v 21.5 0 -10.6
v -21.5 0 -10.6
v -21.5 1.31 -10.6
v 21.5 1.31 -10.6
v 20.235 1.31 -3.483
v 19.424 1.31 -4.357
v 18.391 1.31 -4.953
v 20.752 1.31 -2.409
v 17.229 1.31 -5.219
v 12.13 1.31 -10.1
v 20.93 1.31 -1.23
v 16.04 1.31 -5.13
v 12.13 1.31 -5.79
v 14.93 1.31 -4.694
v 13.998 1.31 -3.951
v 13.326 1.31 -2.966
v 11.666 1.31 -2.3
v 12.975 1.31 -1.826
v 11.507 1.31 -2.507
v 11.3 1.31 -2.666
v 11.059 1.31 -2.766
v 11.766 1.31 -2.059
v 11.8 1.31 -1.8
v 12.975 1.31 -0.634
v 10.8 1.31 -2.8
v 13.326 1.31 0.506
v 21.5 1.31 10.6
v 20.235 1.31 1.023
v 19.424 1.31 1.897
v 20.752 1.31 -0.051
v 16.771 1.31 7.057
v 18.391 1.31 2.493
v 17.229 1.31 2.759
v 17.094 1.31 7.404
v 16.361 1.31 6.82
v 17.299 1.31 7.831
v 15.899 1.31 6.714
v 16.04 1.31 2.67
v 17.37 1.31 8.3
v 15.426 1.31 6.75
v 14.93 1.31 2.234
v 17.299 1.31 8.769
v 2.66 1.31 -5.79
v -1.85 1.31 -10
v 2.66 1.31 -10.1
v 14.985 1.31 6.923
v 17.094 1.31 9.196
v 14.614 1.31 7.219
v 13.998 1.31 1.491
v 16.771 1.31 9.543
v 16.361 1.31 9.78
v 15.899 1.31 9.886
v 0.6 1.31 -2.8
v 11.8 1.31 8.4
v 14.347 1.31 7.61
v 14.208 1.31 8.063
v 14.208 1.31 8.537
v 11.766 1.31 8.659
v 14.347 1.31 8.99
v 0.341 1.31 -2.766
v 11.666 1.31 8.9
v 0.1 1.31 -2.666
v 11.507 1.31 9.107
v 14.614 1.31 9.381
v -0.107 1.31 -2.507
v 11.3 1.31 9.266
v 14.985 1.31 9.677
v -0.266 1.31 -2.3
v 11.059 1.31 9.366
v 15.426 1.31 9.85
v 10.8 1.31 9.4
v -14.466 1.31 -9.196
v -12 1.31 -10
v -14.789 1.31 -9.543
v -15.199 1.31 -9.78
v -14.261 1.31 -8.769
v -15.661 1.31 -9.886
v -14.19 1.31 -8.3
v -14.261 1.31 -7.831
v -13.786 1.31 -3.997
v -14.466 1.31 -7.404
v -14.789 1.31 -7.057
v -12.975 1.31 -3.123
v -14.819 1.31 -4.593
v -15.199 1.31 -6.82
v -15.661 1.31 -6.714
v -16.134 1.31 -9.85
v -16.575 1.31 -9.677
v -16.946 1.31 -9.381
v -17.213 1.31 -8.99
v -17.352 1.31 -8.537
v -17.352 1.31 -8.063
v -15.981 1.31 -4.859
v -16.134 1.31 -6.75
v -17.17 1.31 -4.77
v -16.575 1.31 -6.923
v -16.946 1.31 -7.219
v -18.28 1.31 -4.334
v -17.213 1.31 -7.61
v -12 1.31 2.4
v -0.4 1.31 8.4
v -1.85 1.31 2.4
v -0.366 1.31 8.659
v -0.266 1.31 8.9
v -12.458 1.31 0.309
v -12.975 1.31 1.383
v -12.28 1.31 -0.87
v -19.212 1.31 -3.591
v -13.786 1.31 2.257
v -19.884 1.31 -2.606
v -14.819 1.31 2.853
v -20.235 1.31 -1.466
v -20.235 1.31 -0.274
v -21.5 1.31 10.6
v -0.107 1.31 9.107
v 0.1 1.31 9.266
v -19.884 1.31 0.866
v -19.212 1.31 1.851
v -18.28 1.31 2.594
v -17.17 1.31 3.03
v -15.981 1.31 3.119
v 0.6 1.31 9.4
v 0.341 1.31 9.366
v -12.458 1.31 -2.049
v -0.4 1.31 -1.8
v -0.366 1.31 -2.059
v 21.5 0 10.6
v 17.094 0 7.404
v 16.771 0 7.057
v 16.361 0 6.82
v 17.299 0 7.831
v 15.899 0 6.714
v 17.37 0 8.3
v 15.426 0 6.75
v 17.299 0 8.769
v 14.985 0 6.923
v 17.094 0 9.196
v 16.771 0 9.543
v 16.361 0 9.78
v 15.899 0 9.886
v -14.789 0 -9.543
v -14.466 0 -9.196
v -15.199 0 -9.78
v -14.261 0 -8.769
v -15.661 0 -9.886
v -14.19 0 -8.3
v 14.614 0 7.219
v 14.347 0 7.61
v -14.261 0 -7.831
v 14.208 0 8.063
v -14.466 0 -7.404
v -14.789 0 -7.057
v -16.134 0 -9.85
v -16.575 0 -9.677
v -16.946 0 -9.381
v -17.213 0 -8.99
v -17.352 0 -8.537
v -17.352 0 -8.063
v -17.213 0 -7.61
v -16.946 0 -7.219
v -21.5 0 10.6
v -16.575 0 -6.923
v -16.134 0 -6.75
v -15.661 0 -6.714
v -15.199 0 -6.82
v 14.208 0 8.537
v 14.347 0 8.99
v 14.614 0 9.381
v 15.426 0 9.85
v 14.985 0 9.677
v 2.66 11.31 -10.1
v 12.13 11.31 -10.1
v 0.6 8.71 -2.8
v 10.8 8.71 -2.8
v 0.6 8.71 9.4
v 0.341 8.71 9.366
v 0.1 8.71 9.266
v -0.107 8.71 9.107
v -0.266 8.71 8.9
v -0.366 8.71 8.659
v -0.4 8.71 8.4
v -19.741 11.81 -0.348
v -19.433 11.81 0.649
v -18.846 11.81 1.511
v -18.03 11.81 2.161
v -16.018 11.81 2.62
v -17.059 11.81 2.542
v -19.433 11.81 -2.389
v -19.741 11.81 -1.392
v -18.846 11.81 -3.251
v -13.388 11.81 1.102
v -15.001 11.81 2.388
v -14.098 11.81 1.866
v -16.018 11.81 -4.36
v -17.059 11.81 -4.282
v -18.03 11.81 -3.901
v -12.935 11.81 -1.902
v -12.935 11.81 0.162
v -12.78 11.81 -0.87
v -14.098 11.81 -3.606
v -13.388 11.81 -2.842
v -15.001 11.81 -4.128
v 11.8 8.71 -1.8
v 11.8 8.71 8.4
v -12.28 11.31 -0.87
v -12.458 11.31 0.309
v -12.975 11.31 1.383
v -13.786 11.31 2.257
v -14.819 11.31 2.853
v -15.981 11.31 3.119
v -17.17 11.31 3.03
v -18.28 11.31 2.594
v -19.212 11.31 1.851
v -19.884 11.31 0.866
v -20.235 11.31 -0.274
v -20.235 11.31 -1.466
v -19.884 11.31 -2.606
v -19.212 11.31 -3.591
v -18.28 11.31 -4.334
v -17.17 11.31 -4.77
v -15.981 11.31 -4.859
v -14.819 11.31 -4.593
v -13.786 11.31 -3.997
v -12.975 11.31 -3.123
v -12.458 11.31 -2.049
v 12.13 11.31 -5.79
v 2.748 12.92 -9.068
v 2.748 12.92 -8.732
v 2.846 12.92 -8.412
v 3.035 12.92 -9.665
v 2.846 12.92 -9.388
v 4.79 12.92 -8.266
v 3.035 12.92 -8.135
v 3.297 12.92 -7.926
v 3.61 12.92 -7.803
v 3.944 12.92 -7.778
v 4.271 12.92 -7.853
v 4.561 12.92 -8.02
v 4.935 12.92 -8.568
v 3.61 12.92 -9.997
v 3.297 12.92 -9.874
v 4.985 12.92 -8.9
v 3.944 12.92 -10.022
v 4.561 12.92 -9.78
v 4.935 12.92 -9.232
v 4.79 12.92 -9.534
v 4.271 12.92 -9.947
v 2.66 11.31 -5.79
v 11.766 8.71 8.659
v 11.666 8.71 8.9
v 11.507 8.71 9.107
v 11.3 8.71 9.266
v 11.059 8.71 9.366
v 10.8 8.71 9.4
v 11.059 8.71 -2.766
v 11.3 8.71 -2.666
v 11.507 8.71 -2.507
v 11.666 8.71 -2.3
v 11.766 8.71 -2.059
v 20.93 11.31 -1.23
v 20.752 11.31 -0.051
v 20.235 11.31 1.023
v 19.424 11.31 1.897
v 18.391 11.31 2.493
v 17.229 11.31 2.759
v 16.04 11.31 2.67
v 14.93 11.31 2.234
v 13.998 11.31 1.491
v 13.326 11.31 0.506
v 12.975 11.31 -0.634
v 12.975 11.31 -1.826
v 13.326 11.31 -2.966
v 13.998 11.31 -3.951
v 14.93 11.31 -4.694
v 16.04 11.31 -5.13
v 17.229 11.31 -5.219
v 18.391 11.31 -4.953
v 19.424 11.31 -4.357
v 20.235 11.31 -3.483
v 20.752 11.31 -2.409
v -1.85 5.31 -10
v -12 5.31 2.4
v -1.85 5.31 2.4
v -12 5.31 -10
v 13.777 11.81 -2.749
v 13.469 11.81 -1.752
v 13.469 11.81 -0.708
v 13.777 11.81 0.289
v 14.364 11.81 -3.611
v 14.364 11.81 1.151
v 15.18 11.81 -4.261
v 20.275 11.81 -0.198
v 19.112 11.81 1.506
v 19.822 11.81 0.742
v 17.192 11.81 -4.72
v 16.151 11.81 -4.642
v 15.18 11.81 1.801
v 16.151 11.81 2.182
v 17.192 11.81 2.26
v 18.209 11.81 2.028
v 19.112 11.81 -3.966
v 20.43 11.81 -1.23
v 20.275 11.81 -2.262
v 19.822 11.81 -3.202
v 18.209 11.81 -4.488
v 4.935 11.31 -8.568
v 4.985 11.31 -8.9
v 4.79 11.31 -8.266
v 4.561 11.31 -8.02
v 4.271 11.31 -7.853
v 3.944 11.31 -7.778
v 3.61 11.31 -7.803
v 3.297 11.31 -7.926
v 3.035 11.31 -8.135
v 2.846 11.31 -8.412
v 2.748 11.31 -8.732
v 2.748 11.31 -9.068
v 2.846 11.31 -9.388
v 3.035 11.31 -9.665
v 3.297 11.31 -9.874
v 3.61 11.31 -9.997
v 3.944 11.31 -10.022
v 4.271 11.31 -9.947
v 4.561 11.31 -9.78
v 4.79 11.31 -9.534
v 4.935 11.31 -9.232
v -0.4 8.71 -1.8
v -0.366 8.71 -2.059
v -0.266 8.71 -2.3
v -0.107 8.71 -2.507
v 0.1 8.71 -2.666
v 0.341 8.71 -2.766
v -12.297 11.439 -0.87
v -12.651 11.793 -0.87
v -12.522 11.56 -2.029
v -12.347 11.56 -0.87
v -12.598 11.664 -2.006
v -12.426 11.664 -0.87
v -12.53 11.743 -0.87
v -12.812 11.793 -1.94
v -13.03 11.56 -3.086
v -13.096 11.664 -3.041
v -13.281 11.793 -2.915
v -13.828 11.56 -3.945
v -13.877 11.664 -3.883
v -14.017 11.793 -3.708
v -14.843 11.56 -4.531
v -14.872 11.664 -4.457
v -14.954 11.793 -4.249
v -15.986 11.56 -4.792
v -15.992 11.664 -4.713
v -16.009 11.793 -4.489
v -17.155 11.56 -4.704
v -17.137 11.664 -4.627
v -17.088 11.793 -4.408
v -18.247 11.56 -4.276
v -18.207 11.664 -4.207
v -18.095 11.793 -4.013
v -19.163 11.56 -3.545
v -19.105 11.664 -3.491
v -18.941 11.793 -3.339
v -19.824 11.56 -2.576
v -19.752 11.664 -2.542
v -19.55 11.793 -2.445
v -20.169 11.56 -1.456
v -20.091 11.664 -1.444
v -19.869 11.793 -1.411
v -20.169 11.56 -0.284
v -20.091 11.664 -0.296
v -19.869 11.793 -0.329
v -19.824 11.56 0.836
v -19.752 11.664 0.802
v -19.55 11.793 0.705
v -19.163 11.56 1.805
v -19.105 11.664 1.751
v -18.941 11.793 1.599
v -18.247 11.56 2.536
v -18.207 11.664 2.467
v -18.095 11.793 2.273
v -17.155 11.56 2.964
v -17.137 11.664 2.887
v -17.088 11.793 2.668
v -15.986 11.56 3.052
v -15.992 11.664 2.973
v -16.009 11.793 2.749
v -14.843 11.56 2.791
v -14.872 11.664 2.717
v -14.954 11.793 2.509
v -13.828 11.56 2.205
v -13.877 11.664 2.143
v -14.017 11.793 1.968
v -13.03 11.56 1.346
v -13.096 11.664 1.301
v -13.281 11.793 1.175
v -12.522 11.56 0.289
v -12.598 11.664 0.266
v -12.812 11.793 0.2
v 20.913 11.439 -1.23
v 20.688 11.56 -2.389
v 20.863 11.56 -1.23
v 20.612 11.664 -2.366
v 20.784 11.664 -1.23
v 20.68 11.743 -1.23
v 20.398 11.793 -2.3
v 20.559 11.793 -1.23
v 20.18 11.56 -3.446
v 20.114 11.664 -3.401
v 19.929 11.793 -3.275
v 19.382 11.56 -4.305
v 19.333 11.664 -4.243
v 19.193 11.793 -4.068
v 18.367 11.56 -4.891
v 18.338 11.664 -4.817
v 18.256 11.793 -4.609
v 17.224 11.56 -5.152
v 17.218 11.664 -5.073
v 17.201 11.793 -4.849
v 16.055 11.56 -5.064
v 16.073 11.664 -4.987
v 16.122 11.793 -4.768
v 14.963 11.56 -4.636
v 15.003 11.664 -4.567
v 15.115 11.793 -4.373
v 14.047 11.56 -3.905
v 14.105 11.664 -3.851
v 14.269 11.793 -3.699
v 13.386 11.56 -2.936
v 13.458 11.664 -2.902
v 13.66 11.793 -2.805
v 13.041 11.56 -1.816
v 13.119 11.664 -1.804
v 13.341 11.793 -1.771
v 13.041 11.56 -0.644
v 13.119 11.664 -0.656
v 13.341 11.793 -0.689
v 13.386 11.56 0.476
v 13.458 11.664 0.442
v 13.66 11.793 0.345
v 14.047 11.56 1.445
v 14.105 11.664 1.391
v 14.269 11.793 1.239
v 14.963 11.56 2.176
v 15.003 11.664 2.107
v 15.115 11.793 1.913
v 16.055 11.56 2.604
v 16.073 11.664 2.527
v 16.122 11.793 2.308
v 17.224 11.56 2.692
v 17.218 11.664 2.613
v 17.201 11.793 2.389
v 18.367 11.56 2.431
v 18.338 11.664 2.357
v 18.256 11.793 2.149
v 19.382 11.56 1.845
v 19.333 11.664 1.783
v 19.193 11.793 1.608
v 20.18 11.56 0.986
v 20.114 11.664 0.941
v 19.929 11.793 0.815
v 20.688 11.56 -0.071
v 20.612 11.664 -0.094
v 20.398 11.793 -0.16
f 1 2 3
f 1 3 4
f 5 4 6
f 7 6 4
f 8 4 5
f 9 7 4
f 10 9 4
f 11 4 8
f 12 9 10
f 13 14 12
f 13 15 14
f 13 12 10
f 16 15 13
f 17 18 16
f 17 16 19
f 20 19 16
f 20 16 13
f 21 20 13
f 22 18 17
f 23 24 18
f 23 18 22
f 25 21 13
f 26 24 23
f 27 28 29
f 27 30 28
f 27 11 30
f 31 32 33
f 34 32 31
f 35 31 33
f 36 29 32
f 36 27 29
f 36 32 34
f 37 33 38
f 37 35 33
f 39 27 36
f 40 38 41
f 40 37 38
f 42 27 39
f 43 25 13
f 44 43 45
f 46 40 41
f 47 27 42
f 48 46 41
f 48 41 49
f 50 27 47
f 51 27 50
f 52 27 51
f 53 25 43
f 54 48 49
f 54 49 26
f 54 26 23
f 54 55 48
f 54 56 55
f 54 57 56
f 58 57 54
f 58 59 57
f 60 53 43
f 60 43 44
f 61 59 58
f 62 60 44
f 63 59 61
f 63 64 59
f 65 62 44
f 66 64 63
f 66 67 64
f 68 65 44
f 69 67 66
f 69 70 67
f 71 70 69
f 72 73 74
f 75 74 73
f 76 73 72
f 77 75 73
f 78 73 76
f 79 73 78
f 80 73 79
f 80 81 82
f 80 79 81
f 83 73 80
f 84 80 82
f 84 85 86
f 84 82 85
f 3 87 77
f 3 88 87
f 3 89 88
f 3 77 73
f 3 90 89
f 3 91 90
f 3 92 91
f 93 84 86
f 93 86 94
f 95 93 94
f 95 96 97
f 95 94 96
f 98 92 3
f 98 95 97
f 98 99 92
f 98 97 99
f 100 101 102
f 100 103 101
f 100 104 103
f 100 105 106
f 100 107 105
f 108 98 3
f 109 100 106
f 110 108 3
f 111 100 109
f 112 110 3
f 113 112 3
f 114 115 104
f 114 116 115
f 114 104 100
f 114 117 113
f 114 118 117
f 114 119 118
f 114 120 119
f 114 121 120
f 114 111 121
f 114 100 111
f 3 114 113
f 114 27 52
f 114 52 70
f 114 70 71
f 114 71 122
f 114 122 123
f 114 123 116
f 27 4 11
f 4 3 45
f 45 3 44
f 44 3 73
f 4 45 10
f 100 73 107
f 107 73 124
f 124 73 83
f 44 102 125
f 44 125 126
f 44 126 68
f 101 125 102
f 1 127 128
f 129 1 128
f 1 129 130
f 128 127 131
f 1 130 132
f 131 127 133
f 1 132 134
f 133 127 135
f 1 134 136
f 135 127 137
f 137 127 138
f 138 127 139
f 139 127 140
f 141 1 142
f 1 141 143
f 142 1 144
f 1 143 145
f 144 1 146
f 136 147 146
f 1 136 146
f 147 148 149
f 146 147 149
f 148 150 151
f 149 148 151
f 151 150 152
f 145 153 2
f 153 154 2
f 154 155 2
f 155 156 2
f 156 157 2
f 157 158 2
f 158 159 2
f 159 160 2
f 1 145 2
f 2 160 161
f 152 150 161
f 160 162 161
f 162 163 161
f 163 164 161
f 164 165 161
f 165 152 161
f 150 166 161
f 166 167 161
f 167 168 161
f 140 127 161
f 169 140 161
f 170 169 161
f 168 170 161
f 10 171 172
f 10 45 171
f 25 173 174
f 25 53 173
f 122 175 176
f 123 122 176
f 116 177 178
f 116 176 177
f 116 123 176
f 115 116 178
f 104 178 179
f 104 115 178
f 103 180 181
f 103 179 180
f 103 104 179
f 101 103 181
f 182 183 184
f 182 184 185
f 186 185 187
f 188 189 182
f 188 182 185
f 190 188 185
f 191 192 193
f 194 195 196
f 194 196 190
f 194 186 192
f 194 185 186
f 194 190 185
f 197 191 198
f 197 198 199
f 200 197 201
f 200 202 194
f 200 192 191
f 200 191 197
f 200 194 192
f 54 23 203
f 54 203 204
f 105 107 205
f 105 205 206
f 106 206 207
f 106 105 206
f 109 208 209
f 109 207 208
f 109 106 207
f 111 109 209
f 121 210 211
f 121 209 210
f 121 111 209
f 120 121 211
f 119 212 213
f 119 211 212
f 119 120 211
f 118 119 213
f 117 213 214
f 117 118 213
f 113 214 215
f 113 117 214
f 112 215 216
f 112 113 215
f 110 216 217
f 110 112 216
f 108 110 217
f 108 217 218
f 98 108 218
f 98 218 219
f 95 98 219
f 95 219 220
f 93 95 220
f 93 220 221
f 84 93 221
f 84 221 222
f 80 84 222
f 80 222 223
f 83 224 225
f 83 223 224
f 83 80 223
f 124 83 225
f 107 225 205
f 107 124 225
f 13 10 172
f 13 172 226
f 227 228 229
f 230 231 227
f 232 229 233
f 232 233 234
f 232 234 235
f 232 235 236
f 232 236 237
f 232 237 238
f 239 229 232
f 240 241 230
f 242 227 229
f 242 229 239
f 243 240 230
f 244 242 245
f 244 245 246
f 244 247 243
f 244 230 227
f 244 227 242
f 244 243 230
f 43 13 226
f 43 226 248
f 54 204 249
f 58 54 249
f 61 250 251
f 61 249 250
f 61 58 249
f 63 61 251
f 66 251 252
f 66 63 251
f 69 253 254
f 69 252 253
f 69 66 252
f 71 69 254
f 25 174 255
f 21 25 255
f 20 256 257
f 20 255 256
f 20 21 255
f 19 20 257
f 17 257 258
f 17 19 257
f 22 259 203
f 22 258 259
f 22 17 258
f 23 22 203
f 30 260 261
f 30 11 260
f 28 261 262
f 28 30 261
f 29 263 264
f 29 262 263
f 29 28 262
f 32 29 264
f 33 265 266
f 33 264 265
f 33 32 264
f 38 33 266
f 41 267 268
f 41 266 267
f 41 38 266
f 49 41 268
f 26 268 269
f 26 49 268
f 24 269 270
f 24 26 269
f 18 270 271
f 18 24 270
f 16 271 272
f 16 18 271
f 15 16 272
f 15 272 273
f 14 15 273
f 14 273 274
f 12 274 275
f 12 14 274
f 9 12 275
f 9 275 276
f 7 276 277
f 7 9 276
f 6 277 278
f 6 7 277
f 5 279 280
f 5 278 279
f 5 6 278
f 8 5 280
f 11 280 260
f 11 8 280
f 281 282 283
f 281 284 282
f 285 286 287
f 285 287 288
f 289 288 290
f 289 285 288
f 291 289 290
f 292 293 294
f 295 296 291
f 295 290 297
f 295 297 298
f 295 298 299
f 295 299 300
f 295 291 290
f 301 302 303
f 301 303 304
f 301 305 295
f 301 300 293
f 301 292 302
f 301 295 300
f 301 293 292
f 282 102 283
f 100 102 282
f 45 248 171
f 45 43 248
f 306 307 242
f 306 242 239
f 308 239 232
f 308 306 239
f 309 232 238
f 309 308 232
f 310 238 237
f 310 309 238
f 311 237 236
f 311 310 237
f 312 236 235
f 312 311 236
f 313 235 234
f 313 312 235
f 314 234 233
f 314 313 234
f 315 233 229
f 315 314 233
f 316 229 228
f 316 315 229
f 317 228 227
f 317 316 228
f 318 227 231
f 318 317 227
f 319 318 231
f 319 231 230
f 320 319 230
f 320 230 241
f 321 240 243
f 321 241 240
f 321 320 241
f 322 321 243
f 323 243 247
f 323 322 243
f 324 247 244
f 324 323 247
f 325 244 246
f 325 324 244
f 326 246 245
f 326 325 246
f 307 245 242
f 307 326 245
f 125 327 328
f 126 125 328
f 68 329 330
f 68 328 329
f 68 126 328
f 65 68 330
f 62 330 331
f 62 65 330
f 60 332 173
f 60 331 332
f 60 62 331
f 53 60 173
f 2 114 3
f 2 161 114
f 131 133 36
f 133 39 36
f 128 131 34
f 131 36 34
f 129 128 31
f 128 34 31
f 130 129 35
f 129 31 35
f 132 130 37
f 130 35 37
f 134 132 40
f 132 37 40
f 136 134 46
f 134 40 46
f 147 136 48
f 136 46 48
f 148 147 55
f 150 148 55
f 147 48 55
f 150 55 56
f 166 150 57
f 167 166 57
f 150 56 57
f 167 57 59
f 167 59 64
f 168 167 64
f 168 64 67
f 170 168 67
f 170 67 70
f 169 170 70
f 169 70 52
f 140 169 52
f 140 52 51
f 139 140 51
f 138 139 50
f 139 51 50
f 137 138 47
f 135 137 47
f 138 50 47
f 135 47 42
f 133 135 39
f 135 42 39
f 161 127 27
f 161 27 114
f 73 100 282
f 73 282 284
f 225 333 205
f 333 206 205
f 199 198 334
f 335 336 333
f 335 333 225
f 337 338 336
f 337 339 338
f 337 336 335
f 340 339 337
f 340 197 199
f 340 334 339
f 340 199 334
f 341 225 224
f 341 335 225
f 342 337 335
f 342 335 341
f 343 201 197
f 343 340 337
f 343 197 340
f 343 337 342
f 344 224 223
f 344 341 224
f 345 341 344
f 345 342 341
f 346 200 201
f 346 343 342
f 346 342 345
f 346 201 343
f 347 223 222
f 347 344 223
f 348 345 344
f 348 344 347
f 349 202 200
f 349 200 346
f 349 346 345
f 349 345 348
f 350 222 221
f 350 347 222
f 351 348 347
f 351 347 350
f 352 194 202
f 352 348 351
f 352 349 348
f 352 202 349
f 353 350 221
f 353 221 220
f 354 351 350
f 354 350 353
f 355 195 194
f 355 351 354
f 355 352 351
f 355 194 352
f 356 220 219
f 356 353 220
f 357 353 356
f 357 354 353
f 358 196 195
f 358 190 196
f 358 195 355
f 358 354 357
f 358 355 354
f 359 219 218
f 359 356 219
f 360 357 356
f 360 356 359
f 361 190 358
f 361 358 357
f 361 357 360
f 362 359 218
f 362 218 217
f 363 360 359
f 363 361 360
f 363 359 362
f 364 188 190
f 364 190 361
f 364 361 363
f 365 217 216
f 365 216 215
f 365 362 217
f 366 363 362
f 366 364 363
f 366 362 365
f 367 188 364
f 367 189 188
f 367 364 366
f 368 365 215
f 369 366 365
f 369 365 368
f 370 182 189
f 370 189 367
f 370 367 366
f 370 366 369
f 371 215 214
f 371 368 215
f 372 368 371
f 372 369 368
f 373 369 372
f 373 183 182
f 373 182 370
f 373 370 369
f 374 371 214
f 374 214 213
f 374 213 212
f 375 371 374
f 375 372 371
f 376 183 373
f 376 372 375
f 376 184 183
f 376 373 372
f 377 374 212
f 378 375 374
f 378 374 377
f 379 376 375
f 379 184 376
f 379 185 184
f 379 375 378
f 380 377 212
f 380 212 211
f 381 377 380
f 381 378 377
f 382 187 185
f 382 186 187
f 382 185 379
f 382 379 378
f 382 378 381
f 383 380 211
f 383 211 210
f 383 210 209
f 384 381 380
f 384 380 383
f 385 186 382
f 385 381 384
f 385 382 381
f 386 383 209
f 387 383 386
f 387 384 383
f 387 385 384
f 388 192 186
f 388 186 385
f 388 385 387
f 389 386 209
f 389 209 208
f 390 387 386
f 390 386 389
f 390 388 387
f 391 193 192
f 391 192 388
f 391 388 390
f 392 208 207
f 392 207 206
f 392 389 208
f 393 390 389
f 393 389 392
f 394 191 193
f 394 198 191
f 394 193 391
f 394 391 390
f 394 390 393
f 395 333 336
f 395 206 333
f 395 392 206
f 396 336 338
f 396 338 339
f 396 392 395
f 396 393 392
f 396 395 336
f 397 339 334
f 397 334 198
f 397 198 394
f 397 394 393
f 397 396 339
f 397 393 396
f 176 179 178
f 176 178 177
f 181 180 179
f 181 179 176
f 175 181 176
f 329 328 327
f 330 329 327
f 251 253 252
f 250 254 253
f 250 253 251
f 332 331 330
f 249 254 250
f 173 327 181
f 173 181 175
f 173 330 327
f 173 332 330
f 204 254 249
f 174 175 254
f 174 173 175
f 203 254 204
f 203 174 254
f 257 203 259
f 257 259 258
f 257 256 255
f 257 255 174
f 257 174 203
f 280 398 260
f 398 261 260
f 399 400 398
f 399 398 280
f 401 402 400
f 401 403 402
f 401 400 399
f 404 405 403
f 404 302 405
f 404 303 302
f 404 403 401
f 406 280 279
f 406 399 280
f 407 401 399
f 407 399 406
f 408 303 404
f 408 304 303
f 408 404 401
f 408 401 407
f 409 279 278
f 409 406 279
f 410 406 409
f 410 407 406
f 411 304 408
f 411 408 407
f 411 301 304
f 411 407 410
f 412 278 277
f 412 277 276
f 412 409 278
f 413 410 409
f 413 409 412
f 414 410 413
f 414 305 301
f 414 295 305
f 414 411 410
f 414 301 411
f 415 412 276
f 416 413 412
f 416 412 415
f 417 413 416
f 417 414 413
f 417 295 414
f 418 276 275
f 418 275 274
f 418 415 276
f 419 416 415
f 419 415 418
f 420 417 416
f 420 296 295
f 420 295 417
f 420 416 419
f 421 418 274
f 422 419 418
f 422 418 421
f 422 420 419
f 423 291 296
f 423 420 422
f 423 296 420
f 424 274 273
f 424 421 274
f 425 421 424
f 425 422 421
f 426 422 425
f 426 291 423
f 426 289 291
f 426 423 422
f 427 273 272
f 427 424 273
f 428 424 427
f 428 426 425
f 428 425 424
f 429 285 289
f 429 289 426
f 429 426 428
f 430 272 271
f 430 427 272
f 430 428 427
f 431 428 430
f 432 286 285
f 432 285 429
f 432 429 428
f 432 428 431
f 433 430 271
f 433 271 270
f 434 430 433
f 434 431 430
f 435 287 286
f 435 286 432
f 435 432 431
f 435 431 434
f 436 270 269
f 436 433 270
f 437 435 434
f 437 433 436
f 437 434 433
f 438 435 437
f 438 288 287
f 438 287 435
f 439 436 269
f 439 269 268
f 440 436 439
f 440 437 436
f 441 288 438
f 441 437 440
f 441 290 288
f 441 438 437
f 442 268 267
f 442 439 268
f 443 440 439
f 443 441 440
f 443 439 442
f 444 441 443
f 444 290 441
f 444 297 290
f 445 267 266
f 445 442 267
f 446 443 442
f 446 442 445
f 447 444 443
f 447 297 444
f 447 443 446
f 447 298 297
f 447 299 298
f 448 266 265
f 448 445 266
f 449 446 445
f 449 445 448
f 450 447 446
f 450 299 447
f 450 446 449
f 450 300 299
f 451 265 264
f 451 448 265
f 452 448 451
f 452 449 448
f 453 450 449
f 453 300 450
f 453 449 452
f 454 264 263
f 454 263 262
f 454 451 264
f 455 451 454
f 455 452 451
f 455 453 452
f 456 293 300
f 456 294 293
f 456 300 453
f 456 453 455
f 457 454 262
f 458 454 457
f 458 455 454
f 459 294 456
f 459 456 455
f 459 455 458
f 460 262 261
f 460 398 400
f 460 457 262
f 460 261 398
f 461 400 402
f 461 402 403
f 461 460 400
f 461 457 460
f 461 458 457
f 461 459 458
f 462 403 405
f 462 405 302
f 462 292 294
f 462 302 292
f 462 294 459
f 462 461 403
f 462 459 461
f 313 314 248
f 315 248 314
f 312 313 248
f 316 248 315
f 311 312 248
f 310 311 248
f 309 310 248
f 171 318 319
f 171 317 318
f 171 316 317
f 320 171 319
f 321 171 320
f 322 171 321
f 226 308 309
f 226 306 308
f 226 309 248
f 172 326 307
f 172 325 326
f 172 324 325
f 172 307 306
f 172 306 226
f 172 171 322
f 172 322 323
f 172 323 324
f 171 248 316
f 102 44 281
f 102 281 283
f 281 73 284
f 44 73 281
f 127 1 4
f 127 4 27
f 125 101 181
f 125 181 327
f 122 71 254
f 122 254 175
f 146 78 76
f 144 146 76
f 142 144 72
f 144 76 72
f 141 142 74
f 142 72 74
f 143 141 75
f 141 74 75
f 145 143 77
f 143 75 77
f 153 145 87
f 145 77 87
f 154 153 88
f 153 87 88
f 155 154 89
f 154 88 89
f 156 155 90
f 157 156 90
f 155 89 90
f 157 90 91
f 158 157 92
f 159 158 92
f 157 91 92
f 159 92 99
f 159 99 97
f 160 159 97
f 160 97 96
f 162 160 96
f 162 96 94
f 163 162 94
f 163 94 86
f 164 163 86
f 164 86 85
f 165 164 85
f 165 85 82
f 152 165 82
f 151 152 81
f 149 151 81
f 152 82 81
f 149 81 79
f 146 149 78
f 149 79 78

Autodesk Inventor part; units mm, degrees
ref_plane "YZ Plane" through (0, 0, 0) normal (1, 0, 0) x (0, 1, 0)
ref_plane "XZ Plane" through (0, 0, 0) normal (0, 1, 0) x (-1, 0, 0)
ref_plane "XY Plane" through (0, 0, 0) normal (0, 0, 1) x (1, 0, 0)
sketch "Sketch1" plane through (0, 0, 0) normal (0, 1, 0) x (-1, 0, 0)
  line L0 (21.5, -10.6) -> (-21.5, -10.6)
  line L1 (-21.5, -10.6) -> (-21.5, 10.6)
  line L2 (-21.5, 10.6) -> (21.5, 10.6)
  line L3 (21.5, 10.6) -> (21.5, -10.6)
  point P0 (0, 0)
  dimension "d0" = 43
  dimension "d1" = 21.2
  dimension "d2" = 10.6
  dimension "d3" = 21.5
extrude "Extrusion1" add sketch "Sketch1" along normal blind 1.31
sketch "Sketch2" plane through (0, 1.31, 0) normal (0, 1, 0) x (1, 0, 0)
  line L0 (-12, 10) -> (-1.85, 10)
  line L1 (-1.85, 10) -> (-1.85, -2.4)
  line L2 (-1.85, -2.4) -> (-12, -2.4)
  line L3 (-12, -2.4) -> (-12, 10)
  line L4 (-21.5, -10.6) -> (21.5, -10.6) projected
  line L5 (-21.5, 10.6) -> (-21.5, -10.6) projected
  point P0 (0, 0)
  dimension "d6" = 12.4
  dimension "d7" = 10.15
  dimension "d8" = 8.2
  dimension "d9" = 9.5
extrude "Extrusion2" add sketch "Sketch2" along normal blind 4
sketch "Sketch3" plane through (0, 1.31, 0) normal (0, 1, 0) x (1, 0, 0)
  line L0 (0.6, 2.8) -> (10.8, 2.8)
  line L1 (11.8, 1.8) -> (11.8, -8.4)
  line L2 (10.8, -9.4) -> (0.6, -9.4)
  line L3 (-0.4, -8.4) -> (-0.4, 1.8)
  line L4 (-21.5, -10.6) -> (21.5, -10.6) projected
  line L5 (21.5, -10.6) -> (21.5, 10.6) projected
  arc A0 (0.6, 2.8) -> (-0.4, 1.8) centre (0.6, 1.8) ccw
  arc A1 (11.8, 1.8) -> (10.8, 2.8) centre (10.8, 1.8) ccw
  arc A2 (10.8, -9.4) -> (11.8, -8.4) centre (10.8, -8.4) ccw
  arc A3 (-0.4, -8.4) -> (0.6, -9.4) centre (0.6, -8.4) ccw
  point P0 (0, 0)
  dimension "d12" = 12.2
  dimension "d13" = 12.2
  dimension "d14" = 1.2
  dimension "d15" = 9.7
  dimension "d16" = 1
extrude "Extrusion3" add sketch "Sketch3" along normal blind 7.4
sketch "Sketch4" plane through (0, 1.31, 0) normal (0, 1, 0) x (1, 0, 0)
  line L0 (2.66, 10.1) -> (12.13, 10.1)
  line L1 (12.13, 10.1) -> (12.13, 5.79)
  line L2 (12.13, 5.79) -> (2.66, 5.79)
  line L3 (2.66, 5.79) -> (2.66, 10.1)
  line L4 (21.5, -10.6) -> (21.5, 10.6) projected
  line L5 (21.5, 10.6) -> (-21.5, 10.6) projected
  point P0 (0, 0)
  dimension "d19" = 4.31
  dimension "d20" = 9.47
  dimension "d21" = 9.37
  dimension "d22" = 0.5
extrude "Extrusion4" add sketch "Sketch4" along normal blind 10
sketch "Sketch5" plane through (0, 11.31, 0) normal (0, 1, 0) x (1, 0, 0)
  circle A0 centre (3.86, 8.9) radius 1.125
  line L0 (12.13, 10.1) -> (2.66, 10.1) projected
  line L1 (2.66, 10.1) -> (2.66, 5.79) projected
  point P0 (0, 0)
  point P1 (2.66, 9.2358)
  point P2 (2.66, 8.7642)
  point P3 (4.0958, 10.1)
  point P4 (3.6242, 10.1)
  dimension "d25" = 2.25
  dimension "d26" = 1.2
  dimension "d27" = 1.2
extrude "Extrusion5" add sketch "Sketch5" along normal blind 1.61
sketch "Sketch6" plane through (0, 1.31, 0) normal (0, 1, 0) x (1, 0, 0)
  circle A0 centre (-16.28, 0.87) radius 4
  circle A1 centre (16.93, 1.23) radius 4
  line L0 (-21.5, -10.6) -> (21.5, -10.6) projected
  line L1 (21.5, -10.6) -> (21.5, 10.6) projected
  line L2 (-21.5, 10.6) -> (-21.5, -10.6) projected
  point P0 (0, 0)
  dimension "d30" = 8
  dimension "d31" = 8
  dimension "d32" = 11.83
  dimension "d33" = 4.57
  dimension "d34" = 5.22
  dimension "d35" = 11.47
extrude "Extrusion6" add sketch "Sketch6" along normal blind 10.5
fillet "Fillet1" radius 0.5 2 edges at (12.93, 11.81, -1.23) (-20.28, 11.81, -0.87)
sketch "Sketch7" plane through (0, 1.31, 0) normal (0, 1, 0) x (1, 0, 0)
  circle A0 centre (-15.78, 8.3) radius 1.59
  circle A1 centre (15.78, -8.3) radius 1.59
  line L0 (21.5, -10.6) -> (21.5, 10.6) projected
  line L1 (-21.5, -10.6) -> (21.5, -10.6) projected
  line L2 (21.5, 10.6) -> (-21.5, 10.6) projected
  line L3 (-21.5, 10.6) -> (-21.5, -10.6) projected
  point P0 (0, 0)
  dimension "d39" = 3.18
  dimension "d42" = 3.18
  dimension "d43" = 5.72
  dimension "d44" = 2.3
  dimension "d45" = 2.3
  dimension "d46" = 5.72
extrude "Extrusion7" cut sketch "Sketch7" against normal blind 3.18 contours A0 | A1
equation "\"d2\" = 0.5 * d1"
equation "\"d3\" = 0.5 * d0"
equation "\"d42\" = d39"
equation "\"d47\" = d39"
properties part number "Power Buck Converter"
